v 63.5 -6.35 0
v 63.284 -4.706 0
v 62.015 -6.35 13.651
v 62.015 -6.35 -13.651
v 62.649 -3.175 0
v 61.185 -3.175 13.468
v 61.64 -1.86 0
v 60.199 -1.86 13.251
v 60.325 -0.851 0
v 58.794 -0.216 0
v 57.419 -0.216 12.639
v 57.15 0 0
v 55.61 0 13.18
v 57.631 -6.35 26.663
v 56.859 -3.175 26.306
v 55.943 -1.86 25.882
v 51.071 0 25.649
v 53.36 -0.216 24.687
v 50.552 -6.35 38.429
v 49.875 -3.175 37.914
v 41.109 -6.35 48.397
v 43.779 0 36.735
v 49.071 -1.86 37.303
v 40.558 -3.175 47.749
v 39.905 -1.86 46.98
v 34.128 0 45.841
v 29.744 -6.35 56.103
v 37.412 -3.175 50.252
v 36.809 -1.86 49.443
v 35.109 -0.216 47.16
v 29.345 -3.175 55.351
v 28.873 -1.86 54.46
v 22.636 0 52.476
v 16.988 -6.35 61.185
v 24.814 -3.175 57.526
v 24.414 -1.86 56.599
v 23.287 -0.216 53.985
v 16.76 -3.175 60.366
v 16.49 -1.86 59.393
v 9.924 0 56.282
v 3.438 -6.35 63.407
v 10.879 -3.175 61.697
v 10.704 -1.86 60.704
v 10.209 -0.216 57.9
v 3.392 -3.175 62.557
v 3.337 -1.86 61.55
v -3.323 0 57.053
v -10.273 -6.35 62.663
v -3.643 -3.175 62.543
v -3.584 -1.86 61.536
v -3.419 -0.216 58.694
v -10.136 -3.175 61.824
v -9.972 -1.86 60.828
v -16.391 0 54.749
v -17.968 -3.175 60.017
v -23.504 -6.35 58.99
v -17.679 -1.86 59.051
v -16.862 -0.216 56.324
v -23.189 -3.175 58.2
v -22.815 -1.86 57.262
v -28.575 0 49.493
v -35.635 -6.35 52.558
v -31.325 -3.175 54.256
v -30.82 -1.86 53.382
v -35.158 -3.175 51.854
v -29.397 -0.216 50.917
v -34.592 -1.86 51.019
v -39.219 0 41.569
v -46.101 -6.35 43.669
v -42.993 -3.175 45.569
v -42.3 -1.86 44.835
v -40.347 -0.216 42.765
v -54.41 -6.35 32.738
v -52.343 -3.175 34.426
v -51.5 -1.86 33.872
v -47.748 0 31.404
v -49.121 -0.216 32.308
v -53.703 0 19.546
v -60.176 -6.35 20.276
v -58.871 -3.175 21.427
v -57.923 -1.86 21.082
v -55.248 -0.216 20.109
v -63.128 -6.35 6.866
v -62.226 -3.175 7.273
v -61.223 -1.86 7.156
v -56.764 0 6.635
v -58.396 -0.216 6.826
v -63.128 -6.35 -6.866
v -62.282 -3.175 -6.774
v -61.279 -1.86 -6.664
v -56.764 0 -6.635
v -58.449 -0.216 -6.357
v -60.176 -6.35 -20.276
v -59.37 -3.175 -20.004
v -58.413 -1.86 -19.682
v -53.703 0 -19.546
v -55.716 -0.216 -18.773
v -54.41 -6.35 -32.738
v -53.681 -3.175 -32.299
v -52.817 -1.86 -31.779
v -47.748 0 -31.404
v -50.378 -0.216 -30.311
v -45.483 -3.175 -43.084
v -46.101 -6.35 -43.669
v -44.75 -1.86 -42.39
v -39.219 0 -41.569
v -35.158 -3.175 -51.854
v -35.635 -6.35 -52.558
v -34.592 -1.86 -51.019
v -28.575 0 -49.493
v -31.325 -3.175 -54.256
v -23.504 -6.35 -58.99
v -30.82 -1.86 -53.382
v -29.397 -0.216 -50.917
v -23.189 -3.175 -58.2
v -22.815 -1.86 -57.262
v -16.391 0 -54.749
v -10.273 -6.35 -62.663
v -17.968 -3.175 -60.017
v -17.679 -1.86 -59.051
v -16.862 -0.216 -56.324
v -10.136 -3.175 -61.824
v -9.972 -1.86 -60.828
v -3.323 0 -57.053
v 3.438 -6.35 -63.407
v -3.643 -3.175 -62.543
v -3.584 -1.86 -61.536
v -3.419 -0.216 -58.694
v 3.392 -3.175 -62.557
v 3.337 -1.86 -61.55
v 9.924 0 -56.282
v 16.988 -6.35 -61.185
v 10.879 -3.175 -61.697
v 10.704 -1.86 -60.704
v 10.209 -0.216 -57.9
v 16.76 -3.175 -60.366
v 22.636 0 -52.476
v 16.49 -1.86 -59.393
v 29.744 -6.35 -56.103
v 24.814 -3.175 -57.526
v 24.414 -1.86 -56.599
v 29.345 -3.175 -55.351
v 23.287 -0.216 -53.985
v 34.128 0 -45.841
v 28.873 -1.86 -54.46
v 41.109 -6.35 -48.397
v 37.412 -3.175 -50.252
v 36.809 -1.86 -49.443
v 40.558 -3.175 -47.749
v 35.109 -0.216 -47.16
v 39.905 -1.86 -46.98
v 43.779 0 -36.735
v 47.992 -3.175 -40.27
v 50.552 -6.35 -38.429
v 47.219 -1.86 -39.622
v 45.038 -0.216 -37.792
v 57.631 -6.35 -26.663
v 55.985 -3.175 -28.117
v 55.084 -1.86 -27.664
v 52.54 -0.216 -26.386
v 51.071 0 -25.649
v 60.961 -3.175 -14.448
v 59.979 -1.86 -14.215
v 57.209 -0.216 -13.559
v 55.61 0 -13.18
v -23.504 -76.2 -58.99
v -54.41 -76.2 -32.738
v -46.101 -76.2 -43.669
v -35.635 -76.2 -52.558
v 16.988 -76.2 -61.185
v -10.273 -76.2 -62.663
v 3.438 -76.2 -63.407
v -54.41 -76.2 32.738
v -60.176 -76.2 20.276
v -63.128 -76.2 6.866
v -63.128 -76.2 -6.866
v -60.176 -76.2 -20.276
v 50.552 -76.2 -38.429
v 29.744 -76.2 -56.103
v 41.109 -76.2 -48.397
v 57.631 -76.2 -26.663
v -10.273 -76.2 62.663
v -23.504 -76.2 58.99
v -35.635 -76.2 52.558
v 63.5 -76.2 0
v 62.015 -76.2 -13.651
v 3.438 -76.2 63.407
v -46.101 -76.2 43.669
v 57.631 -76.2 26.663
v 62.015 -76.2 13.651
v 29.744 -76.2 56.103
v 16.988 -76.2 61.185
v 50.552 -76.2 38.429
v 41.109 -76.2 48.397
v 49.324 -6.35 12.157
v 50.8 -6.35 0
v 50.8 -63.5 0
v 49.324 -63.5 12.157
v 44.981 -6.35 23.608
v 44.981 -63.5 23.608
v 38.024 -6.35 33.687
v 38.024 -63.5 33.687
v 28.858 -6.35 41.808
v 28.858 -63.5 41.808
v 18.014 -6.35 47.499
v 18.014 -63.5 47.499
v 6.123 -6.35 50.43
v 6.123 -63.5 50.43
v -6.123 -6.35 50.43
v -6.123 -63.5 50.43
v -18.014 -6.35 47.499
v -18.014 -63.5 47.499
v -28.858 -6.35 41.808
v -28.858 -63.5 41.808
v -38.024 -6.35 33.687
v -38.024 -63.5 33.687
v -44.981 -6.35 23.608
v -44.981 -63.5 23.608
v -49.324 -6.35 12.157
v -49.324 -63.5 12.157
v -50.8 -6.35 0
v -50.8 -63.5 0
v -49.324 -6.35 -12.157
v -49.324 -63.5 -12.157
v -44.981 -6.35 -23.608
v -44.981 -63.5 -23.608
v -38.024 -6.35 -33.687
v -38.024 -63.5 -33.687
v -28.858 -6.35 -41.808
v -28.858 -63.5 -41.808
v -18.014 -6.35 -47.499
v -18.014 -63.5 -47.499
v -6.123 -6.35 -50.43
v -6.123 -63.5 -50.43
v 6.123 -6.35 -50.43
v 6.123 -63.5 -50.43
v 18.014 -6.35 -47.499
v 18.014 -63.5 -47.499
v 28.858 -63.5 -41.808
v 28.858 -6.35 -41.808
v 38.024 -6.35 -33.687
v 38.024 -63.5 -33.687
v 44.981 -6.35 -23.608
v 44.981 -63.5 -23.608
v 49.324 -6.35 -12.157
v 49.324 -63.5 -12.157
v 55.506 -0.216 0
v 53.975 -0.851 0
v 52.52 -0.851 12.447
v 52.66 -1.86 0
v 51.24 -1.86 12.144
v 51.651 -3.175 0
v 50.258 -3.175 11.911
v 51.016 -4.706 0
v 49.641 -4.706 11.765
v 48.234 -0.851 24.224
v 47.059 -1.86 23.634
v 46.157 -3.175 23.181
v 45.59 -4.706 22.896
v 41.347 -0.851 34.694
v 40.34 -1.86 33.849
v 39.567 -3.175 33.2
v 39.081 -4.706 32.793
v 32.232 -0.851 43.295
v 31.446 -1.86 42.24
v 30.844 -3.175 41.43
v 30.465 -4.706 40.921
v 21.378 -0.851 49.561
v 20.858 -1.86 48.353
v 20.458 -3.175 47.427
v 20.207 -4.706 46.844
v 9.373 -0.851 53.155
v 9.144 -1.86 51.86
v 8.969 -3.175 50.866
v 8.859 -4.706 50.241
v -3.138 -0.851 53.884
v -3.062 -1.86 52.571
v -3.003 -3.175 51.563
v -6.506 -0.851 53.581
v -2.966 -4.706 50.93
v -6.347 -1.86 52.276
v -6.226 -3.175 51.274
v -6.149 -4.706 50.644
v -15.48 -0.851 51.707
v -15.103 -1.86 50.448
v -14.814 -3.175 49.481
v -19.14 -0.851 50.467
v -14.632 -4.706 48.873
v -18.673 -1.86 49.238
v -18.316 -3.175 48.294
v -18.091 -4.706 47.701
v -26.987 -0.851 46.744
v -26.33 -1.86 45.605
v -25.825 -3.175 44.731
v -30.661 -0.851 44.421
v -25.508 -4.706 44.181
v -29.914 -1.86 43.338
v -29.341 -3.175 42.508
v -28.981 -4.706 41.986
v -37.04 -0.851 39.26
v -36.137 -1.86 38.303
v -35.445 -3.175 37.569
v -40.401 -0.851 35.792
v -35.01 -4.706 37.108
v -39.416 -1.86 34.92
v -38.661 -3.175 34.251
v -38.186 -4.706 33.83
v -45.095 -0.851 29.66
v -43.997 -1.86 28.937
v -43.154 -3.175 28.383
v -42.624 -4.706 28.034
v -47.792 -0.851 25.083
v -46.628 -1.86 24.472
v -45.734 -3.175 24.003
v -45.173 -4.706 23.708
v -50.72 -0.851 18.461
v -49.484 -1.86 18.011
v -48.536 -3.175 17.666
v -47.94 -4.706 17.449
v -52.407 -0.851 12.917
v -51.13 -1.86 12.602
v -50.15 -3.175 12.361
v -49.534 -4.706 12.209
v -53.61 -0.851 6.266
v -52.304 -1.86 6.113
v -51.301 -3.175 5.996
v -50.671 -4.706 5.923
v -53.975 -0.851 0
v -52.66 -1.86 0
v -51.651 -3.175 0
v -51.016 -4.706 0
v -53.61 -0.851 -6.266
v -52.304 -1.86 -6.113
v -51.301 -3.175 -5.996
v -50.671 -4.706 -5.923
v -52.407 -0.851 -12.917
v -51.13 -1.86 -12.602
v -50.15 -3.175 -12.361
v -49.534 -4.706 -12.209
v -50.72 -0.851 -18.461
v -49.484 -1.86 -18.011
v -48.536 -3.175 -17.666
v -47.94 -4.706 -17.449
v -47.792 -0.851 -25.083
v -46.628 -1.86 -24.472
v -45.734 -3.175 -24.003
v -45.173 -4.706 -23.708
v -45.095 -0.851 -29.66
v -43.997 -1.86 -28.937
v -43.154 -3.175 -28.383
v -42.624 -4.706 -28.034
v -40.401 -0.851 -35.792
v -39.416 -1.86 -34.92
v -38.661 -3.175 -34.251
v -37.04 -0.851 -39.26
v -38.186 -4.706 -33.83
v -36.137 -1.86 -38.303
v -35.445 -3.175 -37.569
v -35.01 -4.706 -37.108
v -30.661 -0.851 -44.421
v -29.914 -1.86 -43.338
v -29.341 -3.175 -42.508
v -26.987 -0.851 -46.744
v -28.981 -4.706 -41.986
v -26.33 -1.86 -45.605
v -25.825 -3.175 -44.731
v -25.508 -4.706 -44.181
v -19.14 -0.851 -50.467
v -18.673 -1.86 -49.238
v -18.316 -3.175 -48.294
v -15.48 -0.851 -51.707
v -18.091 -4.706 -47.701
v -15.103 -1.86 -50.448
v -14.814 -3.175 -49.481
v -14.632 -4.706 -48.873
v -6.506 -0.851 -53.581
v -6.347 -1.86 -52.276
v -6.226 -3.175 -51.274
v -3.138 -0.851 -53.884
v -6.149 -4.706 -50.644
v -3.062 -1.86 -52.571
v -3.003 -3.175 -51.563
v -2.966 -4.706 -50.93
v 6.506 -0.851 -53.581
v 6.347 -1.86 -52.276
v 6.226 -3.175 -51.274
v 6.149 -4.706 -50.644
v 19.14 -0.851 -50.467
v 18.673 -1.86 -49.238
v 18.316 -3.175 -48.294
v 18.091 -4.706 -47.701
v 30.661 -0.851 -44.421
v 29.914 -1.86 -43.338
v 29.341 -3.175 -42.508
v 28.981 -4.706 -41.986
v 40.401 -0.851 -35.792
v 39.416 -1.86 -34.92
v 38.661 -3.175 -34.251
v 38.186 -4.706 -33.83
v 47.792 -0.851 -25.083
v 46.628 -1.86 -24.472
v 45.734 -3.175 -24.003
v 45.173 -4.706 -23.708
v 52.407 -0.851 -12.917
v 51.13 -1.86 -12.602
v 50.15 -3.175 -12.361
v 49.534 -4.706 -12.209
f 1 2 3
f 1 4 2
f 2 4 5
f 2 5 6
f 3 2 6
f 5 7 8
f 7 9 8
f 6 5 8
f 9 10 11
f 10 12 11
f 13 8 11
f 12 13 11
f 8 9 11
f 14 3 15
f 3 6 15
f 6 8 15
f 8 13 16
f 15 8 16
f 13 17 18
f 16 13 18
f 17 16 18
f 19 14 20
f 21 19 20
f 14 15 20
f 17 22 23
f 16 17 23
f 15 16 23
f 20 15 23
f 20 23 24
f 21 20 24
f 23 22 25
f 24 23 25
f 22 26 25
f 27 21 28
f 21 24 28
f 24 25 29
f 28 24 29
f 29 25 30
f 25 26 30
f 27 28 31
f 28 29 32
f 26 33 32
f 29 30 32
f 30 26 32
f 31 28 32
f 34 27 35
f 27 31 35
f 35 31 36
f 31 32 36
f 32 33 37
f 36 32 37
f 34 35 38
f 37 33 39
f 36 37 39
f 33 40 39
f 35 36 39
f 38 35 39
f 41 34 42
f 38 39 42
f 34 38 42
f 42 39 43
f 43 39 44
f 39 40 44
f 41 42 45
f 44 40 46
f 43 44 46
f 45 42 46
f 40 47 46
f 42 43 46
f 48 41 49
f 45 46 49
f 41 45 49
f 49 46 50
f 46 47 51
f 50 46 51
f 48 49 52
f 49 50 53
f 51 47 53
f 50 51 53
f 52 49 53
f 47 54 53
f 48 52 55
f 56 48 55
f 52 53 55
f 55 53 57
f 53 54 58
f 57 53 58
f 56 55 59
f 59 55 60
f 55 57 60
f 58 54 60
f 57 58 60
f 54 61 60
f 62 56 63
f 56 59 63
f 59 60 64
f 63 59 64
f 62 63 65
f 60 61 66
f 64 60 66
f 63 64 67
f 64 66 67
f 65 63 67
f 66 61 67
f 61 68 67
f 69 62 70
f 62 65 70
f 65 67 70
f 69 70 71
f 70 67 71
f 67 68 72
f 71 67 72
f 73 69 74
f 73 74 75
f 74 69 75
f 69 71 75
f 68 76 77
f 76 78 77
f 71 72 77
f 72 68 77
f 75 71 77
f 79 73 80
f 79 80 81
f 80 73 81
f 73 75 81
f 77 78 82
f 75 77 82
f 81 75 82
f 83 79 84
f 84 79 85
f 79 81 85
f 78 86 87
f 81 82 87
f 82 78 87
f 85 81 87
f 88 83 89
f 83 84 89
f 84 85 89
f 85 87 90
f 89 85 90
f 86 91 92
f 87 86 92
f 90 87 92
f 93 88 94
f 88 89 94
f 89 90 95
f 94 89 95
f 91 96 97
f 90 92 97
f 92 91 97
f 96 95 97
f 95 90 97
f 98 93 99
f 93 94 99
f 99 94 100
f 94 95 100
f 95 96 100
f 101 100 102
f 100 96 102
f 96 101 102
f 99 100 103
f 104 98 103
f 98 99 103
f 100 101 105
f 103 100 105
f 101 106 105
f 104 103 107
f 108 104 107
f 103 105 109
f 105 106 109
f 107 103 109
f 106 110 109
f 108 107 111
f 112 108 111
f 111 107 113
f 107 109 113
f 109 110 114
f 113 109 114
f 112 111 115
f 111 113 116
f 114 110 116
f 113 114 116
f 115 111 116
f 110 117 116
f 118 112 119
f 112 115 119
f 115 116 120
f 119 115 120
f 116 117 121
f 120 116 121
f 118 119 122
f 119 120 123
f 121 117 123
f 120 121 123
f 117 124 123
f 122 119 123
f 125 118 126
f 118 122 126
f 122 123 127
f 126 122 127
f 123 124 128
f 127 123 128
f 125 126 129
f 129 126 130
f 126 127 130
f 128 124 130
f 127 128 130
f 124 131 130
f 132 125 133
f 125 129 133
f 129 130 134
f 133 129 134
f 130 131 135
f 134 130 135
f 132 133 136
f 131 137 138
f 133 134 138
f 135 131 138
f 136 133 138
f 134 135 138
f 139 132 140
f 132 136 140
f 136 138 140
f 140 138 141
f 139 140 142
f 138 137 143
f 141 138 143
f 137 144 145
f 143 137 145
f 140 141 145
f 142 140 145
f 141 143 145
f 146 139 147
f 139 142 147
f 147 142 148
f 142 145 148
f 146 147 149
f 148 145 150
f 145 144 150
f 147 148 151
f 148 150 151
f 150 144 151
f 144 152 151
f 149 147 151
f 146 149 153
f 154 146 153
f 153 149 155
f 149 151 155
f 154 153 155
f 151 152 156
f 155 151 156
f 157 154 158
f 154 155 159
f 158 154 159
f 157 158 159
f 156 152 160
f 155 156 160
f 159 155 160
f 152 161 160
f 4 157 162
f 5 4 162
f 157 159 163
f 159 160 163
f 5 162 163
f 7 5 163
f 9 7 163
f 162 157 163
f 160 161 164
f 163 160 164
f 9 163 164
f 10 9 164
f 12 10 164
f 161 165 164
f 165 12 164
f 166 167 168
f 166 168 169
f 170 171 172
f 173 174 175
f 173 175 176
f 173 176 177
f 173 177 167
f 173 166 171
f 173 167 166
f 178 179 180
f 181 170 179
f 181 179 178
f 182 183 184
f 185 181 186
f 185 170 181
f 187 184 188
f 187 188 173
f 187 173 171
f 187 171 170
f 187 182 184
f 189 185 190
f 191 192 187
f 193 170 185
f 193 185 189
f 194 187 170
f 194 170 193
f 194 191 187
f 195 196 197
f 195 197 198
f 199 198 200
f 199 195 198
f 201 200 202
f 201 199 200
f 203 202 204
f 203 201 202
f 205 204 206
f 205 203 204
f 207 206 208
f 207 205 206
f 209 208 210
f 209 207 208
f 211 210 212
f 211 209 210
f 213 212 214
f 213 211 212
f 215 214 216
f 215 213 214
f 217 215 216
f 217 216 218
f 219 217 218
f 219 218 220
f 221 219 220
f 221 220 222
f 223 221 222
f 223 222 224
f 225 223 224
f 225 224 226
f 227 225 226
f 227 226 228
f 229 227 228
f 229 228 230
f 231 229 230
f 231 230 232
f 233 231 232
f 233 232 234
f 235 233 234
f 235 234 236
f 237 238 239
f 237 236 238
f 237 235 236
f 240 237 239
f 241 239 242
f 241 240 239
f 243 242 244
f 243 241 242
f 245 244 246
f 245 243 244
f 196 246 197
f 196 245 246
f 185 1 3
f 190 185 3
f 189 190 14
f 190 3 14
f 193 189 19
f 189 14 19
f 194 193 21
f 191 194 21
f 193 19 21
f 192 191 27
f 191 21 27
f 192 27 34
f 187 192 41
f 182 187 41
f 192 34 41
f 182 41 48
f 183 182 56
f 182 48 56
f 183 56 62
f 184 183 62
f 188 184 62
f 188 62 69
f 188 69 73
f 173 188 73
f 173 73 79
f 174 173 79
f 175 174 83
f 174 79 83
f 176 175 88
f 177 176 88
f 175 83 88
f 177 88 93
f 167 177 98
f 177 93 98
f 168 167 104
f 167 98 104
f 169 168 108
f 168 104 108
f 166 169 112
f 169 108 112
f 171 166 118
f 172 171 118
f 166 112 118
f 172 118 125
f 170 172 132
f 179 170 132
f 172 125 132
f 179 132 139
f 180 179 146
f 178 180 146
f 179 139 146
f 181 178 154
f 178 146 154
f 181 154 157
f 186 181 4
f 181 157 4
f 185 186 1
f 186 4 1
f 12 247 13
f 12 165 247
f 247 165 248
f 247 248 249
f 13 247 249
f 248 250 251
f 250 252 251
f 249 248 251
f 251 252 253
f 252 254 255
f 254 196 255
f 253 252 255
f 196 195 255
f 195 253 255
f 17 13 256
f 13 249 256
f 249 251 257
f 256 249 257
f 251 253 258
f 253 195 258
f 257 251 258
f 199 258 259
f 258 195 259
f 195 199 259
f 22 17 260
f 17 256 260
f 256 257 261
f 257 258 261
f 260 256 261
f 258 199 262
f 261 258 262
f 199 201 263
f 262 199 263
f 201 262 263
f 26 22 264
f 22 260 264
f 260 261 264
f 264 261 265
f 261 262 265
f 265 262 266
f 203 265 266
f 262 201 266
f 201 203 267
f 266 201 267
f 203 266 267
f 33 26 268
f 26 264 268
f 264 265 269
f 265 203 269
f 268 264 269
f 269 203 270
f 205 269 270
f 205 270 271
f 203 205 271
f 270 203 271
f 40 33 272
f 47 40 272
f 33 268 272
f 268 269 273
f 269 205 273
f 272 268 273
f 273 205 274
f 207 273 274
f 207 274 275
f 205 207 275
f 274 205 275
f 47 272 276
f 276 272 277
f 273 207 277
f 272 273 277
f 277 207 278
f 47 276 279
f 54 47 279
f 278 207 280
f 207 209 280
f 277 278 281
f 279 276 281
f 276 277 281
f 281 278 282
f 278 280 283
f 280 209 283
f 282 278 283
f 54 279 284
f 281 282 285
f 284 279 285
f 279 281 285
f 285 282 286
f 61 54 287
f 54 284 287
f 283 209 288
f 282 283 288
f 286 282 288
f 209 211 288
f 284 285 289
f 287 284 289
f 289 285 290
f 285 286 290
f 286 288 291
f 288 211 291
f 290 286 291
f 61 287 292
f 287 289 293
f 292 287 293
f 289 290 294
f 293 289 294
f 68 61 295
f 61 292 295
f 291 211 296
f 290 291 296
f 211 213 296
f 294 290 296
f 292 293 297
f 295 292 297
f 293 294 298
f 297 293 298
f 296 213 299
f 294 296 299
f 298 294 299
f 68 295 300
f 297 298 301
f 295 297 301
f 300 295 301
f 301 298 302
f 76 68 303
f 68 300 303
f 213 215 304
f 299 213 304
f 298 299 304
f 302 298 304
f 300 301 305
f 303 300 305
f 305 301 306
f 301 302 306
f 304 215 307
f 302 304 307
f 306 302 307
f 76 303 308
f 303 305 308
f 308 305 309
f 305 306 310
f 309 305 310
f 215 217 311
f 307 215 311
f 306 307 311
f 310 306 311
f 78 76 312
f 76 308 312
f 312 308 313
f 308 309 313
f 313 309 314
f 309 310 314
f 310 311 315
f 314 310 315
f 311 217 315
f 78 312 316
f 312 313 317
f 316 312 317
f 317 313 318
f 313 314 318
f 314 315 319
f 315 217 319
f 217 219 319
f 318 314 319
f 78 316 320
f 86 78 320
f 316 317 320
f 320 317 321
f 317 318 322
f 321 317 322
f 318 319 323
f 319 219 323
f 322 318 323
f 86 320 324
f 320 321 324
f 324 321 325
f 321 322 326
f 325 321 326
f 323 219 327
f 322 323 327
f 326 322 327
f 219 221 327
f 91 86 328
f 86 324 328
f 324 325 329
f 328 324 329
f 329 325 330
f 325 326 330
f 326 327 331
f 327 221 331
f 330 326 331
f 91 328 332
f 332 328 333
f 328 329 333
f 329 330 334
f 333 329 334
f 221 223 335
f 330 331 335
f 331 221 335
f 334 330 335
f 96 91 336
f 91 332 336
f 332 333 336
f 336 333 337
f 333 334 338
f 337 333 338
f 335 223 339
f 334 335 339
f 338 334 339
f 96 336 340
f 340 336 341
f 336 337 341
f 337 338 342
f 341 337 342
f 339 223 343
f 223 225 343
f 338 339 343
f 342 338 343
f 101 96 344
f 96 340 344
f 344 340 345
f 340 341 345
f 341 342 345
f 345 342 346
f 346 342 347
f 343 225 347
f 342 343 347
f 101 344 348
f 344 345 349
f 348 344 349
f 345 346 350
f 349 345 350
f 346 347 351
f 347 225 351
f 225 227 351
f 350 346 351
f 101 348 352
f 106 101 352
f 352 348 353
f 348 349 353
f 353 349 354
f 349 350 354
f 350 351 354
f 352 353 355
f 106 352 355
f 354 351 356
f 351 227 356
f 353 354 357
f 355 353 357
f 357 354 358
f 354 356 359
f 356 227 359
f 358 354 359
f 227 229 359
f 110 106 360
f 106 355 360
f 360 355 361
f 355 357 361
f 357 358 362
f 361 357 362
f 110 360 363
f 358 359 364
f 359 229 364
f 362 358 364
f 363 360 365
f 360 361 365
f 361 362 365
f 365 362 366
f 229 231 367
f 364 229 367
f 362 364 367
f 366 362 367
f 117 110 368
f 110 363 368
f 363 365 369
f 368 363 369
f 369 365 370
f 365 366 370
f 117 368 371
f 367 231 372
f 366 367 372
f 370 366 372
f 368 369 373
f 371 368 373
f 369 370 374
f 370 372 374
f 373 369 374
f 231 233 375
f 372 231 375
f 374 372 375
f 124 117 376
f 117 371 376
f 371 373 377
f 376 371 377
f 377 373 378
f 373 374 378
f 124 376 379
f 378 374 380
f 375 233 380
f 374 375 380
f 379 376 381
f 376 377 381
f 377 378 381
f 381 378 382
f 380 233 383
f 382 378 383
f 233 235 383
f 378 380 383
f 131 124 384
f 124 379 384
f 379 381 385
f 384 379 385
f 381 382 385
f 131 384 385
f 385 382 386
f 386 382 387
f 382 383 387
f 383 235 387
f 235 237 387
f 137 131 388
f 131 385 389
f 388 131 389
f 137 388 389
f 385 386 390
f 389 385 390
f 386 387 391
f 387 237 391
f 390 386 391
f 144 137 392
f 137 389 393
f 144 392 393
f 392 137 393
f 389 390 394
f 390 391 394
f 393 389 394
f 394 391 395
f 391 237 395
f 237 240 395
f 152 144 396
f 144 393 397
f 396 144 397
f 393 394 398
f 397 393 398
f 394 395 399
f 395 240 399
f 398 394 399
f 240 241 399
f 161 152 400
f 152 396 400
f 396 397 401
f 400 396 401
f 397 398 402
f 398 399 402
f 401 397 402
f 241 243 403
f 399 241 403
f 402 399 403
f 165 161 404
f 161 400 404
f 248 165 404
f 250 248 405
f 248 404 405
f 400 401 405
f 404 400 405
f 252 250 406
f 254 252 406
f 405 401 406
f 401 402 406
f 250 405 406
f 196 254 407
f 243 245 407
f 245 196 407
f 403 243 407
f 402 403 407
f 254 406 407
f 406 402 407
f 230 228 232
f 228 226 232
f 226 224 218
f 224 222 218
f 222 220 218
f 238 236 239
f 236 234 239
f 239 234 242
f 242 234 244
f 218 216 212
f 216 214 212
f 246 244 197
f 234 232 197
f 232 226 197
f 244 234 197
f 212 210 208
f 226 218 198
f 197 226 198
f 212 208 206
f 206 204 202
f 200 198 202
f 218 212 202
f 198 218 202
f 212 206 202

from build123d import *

# Parameters (mm, degrees)
F0_R     = 63.5
F1_DEPTH = 76.2
F2_T     = -12.7
F3_R     = 6.34999


# Not quite as in the source:
# - a fillet or chamfer is up to 0.001 mm smaller than in the source, because OpenCascade refuses the exact size


with BuildPart() as f1:
    # F0 (on Front) → F1 (new body)
    with BuildSketch(Plane.XZ):
        Circle(F0_R)
    extrude(amount=F1_DEPTH)

    # F2
    f2_openings = [f1.faces().sort_by_distance(p)[0] for p in [
        (0, 0, 0),
    ]]
    offset(amount=F2_T, openings=f2_openings)

    # F3 (radius 6.35 in the source; OpenCascade refuses exactly that, so slightly less here)
    f3_edges = [f1.edges().sort_by_distance(p)[0] for p in [
        (-63.5, 0, 0),
        (-50.8, 0, 0),
    ]]
    fillet(f3_edges, radius=F3_R)


solid = f1.part
